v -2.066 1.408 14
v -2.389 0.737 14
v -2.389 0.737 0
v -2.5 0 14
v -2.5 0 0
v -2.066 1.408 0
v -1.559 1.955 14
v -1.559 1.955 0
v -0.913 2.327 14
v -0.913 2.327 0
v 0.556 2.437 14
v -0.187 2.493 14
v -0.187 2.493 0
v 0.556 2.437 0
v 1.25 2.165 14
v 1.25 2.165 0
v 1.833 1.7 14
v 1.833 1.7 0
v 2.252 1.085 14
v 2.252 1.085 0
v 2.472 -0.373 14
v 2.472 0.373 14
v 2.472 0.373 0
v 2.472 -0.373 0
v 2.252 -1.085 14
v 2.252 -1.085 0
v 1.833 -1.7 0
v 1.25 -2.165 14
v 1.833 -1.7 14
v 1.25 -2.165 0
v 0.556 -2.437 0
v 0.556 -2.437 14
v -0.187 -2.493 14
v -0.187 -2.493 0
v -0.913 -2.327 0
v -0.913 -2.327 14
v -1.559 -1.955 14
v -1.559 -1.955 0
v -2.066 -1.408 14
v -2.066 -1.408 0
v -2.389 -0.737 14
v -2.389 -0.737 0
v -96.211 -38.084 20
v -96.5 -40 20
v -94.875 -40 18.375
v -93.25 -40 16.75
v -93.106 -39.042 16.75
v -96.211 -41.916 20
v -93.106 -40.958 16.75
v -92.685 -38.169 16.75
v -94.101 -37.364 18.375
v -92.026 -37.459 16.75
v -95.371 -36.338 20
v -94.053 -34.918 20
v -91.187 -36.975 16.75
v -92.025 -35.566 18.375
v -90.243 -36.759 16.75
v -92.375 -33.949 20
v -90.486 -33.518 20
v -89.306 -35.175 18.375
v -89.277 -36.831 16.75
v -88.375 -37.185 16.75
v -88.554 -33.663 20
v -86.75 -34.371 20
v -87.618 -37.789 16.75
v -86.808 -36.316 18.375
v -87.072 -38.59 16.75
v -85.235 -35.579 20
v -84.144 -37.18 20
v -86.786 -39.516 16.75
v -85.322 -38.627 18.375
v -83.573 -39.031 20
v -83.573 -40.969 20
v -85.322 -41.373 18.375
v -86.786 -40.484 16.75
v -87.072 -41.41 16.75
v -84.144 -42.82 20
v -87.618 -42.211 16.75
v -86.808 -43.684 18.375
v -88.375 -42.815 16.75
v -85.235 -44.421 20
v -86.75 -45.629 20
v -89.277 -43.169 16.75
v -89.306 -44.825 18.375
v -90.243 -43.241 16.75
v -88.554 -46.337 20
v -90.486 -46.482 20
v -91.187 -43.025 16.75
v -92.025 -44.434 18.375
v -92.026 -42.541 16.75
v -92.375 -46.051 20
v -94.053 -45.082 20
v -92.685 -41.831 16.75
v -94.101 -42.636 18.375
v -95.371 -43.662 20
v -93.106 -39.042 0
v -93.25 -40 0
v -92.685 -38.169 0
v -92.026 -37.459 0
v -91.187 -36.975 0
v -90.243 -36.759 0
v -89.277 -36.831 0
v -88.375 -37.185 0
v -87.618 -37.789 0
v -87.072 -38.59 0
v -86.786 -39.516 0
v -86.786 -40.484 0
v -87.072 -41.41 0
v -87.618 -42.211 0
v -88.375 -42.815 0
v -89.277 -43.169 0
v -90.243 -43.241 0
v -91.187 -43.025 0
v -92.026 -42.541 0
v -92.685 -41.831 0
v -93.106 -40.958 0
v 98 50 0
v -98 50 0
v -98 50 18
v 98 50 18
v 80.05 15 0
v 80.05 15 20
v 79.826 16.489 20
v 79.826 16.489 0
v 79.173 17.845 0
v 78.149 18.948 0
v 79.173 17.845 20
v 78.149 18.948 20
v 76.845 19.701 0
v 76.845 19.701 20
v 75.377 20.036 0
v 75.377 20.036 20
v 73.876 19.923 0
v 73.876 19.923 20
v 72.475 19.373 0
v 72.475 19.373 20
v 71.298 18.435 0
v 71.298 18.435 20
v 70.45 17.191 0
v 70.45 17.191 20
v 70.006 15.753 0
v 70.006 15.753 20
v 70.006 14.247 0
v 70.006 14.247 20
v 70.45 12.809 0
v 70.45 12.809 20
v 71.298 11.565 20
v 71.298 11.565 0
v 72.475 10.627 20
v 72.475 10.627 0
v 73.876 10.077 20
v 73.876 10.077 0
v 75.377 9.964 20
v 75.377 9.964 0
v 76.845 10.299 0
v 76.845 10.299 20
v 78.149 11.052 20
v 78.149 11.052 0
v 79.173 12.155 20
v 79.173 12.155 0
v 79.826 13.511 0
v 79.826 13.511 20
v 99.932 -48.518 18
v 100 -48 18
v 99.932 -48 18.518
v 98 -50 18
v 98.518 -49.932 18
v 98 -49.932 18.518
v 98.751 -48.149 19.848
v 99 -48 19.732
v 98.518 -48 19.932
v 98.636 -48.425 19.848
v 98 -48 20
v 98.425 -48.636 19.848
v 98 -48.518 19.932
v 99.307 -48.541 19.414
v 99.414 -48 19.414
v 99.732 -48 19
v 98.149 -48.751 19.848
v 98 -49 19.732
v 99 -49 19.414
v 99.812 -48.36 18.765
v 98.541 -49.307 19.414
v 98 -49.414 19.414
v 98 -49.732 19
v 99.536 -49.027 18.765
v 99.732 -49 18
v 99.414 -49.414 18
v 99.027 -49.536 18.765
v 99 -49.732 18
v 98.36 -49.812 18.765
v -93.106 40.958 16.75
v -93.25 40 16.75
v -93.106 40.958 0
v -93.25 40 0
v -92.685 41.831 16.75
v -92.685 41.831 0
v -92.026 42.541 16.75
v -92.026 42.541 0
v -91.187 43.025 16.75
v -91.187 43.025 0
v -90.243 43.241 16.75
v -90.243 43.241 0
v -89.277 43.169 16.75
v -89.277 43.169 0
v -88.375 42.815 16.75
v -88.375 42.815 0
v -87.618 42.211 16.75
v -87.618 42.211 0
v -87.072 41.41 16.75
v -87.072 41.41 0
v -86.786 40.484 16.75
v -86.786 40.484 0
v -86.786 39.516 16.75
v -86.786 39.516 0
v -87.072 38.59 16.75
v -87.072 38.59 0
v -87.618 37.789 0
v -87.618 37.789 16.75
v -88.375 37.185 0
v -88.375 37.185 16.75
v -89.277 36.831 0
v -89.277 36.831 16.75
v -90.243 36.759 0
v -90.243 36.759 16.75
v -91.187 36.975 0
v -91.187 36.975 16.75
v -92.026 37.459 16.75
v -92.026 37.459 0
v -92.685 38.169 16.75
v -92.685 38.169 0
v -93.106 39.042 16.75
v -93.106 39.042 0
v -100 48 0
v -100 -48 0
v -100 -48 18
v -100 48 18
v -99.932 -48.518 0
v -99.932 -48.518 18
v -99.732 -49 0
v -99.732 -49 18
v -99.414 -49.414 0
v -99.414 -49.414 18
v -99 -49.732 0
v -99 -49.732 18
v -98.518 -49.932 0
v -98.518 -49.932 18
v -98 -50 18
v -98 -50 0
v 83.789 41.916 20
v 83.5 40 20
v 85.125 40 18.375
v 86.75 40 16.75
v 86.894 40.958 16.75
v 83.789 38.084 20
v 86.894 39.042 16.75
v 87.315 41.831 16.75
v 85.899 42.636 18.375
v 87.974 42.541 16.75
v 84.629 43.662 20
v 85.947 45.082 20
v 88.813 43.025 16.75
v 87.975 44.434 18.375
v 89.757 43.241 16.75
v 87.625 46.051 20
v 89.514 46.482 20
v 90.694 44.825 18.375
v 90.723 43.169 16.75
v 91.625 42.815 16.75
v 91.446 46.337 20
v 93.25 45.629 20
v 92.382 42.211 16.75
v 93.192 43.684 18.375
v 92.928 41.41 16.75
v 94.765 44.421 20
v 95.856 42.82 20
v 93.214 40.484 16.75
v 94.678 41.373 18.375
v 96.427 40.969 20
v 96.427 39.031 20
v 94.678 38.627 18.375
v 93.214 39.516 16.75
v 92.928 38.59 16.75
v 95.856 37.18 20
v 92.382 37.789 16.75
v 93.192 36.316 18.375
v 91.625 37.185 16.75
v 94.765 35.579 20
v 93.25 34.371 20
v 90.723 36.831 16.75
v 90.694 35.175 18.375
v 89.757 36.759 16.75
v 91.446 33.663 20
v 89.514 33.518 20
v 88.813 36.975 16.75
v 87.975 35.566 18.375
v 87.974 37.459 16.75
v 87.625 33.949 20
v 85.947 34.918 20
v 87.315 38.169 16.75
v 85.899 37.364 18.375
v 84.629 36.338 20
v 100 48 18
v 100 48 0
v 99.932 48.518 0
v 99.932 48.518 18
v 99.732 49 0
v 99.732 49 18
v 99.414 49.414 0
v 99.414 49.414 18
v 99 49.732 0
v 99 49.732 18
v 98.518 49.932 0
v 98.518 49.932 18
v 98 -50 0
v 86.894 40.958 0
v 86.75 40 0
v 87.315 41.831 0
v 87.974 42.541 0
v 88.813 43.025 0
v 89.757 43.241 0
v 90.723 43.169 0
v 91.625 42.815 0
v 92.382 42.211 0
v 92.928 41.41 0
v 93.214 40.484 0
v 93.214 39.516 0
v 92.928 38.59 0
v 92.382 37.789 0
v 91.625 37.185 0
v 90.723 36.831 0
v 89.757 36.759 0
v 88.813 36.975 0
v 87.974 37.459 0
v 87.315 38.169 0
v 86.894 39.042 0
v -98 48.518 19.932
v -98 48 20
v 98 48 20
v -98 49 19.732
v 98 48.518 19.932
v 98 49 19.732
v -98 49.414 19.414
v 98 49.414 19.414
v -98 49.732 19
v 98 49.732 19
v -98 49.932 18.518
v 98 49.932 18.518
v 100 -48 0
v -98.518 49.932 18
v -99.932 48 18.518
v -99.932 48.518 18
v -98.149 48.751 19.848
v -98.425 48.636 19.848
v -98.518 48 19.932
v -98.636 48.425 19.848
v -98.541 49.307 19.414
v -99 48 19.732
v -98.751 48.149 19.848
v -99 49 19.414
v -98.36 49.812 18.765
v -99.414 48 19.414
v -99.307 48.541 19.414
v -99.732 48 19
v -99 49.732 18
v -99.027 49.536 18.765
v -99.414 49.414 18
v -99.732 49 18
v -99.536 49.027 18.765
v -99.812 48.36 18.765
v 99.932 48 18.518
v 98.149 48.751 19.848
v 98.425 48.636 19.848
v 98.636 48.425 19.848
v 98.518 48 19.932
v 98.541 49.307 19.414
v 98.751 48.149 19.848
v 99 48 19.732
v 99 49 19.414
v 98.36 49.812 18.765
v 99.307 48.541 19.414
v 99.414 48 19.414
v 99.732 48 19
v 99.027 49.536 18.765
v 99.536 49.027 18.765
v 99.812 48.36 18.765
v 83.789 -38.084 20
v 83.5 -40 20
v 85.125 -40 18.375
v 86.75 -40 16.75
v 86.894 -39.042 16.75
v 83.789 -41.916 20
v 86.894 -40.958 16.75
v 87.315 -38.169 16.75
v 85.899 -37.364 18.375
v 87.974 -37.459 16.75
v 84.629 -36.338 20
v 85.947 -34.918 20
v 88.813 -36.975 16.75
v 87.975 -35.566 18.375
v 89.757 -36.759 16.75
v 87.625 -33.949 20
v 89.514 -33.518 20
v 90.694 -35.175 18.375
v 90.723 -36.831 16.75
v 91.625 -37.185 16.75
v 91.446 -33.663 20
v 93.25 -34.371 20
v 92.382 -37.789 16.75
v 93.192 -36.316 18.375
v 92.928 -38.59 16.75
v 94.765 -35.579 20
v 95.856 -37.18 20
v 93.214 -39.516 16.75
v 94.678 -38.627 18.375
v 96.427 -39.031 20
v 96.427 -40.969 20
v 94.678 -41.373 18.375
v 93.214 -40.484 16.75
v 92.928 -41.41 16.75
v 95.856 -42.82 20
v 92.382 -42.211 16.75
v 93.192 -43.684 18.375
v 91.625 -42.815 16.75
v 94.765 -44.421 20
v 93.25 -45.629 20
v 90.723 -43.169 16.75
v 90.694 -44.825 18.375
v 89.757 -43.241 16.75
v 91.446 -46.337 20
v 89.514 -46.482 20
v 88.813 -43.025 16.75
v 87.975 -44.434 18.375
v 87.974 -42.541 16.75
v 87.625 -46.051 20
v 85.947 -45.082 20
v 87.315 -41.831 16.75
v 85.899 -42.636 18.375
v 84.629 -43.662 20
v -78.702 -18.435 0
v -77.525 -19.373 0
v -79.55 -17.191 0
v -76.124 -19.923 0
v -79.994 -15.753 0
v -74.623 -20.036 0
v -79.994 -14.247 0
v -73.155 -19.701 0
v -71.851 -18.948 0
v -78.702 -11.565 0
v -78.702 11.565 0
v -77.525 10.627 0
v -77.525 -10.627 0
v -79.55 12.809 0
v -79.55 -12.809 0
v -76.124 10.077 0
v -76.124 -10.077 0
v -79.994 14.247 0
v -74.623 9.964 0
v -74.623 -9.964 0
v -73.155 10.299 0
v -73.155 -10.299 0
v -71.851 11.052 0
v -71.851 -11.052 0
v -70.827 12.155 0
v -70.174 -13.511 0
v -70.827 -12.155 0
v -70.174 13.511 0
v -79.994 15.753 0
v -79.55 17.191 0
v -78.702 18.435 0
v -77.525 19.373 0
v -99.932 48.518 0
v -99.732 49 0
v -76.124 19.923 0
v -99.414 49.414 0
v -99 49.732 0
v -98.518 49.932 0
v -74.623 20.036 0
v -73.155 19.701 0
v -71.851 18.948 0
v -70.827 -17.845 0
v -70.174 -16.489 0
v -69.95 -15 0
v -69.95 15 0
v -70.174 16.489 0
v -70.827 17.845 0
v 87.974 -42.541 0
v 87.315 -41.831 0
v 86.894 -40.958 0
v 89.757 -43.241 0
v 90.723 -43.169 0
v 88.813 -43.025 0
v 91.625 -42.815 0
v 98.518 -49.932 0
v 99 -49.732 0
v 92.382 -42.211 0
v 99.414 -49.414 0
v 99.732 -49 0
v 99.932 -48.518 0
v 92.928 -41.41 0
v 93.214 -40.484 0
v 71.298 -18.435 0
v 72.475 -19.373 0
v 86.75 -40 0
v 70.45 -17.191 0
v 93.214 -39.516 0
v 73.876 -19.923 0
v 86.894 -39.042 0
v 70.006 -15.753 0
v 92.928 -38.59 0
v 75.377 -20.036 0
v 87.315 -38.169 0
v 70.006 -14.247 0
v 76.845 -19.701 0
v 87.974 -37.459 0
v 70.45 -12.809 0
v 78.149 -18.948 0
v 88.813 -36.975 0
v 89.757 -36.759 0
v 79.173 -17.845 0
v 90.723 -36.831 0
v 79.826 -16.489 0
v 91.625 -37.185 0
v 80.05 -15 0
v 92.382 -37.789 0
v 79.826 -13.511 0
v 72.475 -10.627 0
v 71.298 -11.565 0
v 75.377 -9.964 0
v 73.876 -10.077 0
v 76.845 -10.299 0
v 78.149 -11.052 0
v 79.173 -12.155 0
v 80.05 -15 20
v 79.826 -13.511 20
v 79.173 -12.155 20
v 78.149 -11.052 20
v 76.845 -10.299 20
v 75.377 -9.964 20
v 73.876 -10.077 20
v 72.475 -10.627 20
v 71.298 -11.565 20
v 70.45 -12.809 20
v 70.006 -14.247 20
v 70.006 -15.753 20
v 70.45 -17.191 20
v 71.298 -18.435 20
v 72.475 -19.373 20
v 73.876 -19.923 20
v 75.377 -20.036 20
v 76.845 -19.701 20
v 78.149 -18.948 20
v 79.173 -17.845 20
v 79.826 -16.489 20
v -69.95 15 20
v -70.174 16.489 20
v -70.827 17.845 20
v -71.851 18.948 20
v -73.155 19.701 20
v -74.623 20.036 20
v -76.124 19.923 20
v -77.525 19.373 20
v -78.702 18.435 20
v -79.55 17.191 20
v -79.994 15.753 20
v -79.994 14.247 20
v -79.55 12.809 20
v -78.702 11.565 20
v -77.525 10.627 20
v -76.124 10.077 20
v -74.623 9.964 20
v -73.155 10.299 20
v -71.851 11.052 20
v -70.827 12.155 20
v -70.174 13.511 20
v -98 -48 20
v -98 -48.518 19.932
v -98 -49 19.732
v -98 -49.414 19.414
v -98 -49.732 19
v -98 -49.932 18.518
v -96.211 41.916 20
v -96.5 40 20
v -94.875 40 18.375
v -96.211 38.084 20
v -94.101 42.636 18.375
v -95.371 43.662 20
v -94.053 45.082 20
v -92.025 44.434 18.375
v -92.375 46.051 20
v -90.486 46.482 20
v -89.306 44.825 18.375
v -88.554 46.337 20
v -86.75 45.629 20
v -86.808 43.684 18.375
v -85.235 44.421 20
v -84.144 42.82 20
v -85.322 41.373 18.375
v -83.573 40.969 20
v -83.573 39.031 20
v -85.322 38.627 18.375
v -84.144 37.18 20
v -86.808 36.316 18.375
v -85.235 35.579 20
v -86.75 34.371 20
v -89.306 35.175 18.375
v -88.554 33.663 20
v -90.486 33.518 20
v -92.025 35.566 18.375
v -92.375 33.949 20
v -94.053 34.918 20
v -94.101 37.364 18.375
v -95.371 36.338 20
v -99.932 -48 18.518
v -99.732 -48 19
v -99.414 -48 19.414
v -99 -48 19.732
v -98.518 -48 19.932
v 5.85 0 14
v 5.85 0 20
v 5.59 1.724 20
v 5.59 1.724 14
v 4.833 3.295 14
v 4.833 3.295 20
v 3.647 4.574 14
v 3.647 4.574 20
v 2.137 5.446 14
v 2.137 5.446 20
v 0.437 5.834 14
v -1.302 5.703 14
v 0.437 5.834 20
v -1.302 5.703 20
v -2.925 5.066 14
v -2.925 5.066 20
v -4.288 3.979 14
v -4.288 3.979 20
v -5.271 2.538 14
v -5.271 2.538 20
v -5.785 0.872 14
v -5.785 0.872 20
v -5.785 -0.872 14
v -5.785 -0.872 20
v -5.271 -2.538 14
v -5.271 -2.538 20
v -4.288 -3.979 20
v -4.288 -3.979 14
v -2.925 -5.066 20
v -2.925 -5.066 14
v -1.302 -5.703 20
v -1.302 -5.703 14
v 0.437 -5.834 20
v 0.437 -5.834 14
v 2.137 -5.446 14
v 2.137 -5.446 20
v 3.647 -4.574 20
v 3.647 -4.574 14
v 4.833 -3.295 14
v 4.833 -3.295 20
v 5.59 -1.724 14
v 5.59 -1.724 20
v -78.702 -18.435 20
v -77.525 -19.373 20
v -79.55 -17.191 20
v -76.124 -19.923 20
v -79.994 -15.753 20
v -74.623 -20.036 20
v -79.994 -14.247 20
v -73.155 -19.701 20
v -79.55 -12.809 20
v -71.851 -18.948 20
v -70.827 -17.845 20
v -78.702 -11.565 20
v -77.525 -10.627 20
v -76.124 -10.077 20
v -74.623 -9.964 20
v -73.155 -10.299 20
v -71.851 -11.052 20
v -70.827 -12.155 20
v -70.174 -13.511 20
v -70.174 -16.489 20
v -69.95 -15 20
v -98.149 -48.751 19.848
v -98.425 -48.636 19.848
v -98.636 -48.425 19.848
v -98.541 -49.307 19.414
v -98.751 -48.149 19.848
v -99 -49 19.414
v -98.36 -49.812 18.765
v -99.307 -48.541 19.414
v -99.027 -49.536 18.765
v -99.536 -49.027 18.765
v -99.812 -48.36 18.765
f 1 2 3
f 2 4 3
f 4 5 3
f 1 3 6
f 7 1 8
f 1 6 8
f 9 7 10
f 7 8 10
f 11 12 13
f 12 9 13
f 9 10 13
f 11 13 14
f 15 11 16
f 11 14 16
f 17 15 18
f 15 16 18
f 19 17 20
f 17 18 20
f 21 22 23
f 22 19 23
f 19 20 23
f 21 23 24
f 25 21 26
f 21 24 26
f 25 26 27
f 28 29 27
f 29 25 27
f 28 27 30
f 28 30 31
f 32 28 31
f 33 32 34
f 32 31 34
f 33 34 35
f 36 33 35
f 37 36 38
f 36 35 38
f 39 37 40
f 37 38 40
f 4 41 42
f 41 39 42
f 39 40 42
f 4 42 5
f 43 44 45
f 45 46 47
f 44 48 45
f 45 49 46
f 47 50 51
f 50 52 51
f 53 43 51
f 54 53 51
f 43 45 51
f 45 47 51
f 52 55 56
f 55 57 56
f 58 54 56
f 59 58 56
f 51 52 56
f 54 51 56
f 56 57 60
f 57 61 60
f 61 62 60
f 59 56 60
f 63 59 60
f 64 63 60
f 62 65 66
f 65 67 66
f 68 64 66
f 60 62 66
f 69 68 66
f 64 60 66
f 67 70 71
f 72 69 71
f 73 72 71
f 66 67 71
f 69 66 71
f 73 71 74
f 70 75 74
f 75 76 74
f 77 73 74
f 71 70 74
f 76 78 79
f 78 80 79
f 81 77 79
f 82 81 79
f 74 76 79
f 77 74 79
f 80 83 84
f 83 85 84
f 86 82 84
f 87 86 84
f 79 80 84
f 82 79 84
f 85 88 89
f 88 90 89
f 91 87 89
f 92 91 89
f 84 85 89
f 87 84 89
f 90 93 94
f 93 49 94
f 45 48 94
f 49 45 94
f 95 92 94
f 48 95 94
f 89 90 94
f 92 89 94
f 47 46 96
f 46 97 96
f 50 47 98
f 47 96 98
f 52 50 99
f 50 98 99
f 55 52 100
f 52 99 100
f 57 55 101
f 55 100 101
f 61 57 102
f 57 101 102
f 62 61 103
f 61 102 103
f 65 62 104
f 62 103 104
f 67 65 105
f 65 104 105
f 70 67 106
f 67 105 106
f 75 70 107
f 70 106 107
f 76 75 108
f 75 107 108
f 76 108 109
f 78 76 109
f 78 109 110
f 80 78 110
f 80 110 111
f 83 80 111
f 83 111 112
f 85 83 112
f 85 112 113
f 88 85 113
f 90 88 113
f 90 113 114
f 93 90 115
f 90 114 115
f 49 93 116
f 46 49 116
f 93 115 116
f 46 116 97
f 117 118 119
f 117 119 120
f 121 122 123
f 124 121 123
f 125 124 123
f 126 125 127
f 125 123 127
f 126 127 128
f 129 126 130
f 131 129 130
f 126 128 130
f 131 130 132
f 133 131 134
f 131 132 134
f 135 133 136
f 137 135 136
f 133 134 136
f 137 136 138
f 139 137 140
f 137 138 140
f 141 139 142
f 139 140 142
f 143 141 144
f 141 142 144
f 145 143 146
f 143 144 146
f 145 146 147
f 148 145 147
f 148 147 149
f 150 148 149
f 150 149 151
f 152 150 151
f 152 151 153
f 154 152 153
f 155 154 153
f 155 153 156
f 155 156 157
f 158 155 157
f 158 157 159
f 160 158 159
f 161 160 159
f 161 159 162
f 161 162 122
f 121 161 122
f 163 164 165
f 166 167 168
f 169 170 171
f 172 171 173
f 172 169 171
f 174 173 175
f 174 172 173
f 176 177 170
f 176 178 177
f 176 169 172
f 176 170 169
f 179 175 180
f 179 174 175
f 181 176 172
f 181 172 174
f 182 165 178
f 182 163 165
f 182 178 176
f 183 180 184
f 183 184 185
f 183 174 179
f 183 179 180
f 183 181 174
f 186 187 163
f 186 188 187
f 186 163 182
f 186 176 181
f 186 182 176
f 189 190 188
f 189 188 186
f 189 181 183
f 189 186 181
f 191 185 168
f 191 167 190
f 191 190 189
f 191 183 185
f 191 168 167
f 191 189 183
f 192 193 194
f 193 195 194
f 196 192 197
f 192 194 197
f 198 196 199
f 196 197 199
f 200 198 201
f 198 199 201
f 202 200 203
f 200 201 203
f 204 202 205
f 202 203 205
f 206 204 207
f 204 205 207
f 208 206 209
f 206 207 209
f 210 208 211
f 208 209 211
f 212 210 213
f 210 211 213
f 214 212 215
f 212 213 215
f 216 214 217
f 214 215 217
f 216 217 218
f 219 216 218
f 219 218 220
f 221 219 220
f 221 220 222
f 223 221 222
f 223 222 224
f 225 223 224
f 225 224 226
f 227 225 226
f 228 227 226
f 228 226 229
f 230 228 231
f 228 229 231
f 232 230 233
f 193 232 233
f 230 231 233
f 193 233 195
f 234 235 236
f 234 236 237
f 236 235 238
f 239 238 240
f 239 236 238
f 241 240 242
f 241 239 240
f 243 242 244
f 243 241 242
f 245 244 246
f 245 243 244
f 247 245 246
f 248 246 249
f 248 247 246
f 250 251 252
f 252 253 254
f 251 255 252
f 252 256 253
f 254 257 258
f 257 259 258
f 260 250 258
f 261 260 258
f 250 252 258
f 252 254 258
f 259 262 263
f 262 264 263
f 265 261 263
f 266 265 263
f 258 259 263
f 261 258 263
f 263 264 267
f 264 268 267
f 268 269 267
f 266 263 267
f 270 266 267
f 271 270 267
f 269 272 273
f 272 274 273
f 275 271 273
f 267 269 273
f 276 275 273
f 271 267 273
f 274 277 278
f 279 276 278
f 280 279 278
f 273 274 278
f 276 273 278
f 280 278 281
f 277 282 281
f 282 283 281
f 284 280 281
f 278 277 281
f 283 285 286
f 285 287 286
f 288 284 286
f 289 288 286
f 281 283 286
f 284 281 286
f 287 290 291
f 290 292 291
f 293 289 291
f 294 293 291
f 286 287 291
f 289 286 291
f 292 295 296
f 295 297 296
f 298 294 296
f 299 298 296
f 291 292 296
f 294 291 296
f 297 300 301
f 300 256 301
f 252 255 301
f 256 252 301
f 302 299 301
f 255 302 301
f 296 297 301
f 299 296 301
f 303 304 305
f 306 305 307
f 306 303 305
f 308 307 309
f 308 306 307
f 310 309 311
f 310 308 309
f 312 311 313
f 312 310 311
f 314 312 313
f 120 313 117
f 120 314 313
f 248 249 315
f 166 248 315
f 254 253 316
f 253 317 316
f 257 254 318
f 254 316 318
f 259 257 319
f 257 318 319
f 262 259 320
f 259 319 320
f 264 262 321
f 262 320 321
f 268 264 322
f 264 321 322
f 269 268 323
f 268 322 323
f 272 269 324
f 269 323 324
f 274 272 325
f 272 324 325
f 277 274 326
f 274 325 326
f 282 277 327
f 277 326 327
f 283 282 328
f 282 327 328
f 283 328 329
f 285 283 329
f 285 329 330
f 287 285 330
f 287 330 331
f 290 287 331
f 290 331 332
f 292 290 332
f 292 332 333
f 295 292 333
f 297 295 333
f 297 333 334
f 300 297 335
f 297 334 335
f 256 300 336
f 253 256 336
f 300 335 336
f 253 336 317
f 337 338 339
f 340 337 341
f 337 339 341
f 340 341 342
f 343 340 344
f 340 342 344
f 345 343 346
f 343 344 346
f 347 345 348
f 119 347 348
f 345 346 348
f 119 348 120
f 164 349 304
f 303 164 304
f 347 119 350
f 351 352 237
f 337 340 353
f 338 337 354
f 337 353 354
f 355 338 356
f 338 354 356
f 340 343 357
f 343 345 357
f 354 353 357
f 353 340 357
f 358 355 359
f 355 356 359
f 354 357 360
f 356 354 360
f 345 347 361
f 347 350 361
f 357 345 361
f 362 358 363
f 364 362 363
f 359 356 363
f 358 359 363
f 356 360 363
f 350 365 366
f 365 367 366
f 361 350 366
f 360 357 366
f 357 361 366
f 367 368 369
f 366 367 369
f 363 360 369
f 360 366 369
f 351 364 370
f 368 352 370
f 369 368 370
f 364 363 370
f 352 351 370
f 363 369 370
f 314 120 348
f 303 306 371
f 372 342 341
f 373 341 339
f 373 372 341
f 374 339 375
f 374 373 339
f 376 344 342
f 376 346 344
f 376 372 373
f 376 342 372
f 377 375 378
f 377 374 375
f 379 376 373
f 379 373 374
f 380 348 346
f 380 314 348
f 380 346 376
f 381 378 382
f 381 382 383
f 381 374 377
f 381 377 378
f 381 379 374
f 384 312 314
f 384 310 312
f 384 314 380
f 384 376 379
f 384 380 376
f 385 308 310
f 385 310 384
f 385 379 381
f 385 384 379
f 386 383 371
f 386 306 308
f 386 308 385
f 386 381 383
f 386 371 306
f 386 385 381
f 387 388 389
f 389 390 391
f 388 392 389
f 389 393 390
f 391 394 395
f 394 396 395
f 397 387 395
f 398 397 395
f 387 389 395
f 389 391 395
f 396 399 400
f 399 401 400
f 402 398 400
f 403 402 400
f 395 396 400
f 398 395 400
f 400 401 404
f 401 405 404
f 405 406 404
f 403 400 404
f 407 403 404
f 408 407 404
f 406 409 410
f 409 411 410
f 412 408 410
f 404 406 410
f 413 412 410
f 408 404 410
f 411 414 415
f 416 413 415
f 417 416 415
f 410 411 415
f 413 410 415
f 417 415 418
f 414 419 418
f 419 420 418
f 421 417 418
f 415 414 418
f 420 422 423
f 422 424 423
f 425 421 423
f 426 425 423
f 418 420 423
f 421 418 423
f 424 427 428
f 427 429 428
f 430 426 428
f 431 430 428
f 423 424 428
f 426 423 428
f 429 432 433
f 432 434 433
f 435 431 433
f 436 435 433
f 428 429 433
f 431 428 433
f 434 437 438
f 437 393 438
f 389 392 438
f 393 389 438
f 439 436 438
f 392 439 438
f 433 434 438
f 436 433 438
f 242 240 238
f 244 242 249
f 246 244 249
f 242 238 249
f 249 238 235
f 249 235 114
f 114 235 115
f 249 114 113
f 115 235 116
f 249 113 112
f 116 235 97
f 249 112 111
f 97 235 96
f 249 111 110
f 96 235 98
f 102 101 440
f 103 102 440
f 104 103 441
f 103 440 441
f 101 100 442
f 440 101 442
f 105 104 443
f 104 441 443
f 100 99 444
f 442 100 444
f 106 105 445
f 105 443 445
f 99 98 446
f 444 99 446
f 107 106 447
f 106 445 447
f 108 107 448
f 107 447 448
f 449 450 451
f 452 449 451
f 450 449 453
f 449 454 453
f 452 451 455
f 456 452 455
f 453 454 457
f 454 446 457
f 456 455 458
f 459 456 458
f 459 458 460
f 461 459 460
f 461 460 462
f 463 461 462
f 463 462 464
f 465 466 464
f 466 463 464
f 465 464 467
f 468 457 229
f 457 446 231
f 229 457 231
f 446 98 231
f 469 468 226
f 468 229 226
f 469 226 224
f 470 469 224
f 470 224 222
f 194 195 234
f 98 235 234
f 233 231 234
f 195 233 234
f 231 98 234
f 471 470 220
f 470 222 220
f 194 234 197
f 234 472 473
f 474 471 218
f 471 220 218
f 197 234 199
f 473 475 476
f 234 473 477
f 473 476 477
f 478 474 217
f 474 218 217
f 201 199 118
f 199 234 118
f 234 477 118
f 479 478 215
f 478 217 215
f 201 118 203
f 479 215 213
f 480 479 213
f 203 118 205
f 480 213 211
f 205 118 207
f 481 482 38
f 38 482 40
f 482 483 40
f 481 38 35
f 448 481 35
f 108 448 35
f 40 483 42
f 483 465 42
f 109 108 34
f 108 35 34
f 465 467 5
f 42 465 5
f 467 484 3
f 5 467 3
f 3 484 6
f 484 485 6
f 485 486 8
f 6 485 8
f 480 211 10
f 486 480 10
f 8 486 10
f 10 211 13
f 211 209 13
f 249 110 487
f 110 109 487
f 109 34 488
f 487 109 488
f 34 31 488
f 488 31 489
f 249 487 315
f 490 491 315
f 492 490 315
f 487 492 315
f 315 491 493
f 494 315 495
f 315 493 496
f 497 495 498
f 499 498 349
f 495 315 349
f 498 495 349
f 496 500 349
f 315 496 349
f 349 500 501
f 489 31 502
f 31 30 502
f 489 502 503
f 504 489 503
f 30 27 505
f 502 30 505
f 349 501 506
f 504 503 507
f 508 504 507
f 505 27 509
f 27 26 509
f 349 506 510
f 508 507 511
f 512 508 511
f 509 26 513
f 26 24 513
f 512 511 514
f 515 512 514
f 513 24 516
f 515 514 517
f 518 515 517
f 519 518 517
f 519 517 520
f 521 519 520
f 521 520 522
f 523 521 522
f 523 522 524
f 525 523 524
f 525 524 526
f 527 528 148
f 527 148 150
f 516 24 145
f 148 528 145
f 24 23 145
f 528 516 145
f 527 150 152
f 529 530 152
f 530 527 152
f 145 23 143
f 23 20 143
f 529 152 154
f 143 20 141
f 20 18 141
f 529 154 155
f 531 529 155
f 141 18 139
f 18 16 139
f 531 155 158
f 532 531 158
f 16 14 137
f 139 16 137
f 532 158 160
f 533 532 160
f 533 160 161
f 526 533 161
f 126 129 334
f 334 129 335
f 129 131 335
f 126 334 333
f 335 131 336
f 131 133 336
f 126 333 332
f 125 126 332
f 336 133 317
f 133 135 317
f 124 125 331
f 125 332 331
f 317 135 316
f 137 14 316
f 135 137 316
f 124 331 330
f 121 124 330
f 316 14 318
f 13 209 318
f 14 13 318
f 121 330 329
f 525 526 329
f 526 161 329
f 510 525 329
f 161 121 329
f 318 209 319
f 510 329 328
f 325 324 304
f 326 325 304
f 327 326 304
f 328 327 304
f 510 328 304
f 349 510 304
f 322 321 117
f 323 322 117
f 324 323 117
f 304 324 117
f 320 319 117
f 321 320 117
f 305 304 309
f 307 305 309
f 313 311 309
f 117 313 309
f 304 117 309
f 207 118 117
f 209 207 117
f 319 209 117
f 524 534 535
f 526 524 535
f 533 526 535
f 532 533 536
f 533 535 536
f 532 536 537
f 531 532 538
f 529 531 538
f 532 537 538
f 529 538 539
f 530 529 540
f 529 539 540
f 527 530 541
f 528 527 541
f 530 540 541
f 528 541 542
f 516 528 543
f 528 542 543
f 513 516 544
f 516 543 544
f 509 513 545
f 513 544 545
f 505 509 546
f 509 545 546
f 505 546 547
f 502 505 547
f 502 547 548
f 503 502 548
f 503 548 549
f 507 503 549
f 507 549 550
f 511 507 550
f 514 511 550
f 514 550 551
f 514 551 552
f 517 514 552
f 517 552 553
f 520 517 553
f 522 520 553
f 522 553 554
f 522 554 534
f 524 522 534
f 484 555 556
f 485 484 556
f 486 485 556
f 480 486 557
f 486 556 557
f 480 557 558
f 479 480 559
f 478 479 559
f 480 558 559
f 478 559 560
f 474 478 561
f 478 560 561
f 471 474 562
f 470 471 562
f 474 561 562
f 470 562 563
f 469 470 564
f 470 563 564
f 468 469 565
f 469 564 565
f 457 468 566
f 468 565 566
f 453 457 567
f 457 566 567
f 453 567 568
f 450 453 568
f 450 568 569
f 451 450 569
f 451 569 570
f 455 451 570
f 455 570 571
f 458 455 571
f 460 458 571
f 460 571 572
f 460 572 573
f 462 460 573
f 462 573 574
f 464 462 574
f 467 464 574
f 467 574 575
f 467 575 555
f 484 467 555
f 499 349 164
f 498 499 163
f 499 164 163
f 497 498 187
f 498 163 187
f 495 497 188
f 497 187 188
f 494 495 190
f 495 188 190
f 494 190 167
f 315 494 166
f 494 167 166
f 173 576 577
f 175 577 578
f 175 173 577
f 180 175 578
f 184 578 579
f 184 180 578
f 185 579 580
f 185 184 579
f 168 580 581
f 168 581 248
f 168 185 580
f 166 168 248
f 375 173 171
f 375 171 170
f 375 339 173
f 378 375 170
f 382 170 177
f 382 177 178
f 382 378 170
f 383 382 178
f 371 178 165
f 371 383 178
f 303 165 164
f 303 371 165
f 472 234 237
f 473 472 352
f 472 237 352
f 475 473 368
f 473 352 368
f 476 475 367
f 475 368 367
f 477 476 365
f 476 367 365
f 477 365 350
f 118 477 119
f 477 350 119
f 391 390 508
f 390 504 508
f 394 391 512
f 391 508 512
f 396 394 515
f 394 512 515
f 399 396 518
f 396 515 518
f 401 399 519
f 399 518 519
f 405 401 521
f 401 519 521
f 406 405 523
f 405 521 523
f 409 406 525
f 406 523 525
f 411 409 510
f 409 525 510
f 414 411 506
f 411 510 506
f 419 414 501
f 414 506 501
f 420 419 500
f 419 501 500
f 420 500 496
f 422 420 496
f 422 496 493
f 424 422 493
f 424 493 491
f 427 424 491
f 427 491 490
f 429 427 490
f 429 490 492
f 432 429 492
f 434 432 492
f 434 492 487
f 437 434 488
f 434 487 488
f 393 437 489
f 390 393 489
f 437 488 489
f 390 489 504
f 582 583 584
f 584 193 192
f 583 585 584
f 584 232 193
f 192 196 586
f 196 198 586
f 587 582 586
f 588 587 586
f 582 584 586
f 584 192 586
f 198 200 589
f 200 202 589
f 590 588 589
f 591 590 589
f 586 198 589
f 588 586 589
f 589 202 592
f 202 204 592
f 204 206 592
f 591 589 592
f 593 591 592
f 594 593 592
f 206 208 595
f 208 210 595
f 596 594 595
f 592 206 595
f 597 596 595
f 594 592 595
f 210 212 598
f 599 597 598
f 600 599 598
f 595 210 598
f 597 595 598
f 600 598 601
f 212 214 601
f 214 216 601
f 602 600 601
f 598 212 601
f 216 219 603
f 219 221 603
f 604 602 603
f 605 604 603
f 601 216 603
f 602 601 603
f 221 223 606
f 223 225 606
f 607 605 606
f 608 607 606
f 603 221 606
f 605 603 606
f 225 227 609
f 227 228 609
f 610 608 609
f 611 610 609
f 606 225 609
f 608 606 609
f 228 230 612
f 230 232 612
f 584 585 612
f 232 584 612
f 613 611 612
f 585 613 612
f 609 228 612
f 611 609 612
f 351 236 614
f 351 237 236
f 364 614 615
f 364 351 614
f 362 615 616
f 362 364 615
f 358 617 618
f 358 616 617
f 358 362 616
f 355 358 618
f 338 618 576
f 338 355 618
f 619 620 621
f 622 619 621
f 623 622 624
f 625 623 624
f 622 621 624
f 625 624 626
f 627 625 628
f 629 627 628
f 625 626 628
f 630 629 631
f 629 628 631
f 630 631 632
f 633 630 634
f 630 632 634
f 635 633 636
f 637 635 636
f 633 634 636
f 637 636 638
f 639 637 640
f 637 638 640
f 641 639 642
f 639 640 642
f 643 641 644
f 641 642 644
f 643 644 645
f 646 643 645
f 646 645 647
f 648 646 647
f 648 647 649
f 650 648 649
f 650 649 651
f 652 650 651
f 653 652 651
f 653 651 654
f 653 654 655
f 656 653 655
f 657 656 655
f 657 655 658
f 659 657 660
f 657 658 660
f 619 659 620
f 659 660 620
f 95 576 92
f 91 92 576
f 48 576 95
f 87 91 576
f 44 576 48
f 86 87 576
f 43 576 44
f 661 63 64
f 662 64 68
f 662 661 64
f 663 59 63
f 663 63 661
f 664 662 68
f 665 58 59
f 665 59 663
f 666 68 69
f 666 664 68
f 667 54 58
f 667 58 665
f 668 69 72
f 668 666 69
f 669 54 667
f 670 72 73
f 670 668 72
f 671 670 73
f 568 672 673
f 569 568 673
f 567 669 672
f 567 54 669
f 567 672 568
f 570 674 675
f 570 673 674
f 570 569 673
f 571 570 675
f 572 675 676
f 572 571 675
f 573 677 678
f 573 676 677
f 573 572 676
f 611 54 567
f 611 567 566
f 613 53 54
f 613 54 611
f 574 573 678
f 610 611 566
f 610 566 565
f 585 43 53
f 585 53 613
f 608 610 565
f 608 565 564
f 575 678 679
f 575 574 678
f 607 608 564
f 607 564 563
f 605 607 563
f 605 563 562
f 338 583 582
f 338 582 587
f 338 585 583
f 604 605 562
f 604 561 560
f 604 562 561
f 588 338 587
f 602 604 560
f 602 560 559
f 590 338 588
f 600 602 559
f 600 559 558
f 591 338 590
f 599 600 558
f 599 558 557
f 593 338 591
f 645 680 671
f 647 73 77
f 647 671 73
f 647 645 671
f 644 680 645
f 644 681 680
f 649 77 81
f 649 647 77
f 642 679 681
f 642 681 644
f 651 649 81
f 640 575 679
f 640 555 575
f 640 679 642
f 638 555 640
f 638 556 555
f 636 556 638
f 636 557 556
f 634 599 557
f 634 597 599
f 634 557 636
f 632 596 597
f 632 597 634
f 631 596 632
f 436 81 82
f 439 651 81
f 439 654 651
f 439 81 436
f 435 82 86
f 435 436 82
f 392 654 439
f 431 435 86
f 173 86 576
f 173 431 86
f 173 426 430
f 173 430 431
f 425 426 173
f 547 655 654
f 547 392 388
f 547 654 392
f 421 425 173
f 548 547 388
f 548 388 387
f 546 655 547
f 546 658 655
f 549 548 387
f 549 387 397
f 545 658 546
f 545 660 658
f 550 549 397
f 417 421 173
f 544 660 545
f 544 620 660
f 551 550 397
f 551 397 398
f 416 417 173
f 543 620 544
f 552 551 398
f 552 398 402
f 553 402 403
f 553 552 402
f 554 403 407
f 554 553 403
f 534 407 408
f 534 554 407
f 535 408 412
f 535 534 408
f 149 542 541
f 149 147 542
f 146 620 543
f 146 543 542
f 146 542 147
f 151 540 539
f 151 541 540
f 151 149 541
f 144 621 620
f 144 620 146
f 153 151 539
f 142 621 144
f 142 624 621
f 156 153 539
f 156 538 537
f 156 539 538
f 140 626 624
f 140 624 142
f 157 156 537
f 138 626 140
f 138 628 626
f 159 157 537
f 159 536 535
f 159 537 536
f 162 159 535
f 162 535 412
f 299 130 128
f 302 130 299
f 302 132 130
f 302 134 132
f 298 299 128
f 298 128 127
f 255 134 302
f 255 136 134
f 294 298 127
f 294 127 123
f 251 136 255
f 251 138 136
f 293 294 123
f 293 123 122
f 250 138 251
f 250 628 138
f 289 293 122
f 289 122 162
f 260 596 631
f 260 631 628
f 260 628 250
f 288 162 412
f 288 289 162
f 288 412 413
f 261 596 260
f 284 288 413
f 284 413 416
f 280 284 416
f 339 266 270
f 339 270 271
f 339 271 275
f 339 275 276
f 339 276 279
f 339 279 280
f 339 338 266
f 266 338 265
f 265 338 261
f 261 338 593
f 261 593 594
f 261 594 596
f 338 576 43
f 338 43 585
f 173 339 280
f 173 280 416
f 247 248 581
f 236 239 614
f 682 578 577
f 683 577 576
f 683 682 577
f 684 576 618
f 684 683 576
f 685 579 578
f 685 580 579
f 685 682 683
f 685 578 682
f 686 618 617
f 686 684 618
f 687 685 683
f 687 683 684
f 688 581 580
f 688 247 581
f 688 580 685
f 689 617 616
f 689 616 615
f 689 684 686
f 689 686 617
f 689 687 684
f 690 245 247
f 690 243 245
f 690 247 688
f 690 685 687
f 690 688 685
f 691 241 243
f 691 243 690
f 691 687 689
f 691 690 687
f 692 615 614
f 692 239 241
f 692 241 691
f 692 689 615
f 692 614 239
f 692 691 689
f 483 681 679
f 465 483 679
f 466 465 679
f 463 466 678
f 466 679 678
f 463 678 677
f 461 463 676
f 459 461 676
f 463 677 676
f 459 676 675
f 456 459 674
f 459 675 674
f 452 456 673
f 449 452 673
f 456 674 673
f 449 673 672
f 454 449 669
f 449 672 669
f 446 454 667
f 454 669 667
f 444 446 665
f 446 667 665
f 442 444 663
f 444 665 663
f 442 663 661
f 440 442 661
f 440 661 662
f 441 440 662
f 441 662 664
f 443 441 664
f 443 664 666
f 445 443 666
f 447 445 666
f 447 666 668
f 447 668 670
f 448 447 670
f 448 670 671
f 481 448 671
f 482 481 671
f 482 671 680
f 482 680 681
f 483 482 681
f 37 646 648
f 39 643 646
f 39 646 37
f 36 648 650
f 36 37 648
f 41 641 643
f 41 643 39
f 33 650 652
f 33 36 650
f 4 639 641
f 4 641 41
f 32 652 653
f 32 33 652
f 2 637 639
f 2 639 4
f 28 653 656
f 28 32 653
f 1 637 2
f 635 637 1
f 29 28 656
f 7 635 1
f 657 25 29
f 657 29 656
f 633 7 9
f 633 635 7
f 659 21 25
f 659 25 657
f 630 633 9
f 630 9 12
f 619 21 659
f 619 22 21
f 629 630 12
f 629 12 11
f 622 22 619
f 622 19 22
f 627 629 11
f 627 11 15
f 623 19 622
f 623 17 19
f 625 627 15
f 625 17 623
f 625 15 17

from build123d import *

# Parameters (mm, degrees)
F0_W           = 200
F0_H           = 100
F1_DEPTH       = 20
F2_R           = 5.05
F3_DEPTH       = 20.001
F5_D           = 6.5
F5_DEPTH       = 25
F5_CSINK_D     = 13
F5_CSINK_ANGLE = 90
F5_TIP         = 1.9527970118
F7_D           = 5
F7_DEPTH       = 20
F7_TIP         = 1.5021515476
F8_R           = 5.85
F8_R_2         = 2.5
F9_DEPTH       = 6
F10_R          = 2


with BuildPart() as f1:
    # F0 (on Top) → F1 (new body)
    with BuildSketch(Plane.XY):
        Rectangle(F0_W, F0_H)
    extrude(amount=F1_DEPTH)

    # F2 (on face) → F3 (cut, through all)
    with BuildSketch(Plane.XY.offset(20)):
        with Locations((-75, 15)):
            Circle(F2_R)
        with Locations((-75, -15)):
            Circle(F2_R)
        with Locations((75, -15)):
            Circle(F2_R)
        with Locations((75, 15)):
            Circle(F2_R)
    extrude(amount=-F3_DEPTH, mode=Mode.SUBTRACT)

    # F5
    with Locations(Plane.XY.offset(20)):
        with Locations((-90, 40), (90, 40), (90, -40), (-90, -40)):
            CounterSinkHole(F5_D / 2, F5_CSINK_D / 2, depth=F5_DEPTH, counter_sink_angle=F5_CSINK_ANGLE)
            with Locations((0, 0, -(F5_DEPTH + F5_TIP / 2))):  # 118° drill point
                Cone(0, F5_D / 2, F5_TIP, mode=Mode.SUBTRACT)

    # F7
    with Locations(Plane.XY.offset(20)):
        with Locations((0, 0)):
            Hole(F7_D / 2, depth=F7_DEPTH)
            with Locations((0, 0, -(F7_DEPTH + F7_TIP / 2))):  # 118° drill point
                Cone(0, F7_D / 2, F7_TIP, mode=Mode.SUBTRACT)

    # F8 (on face) → F9 (cut)
    with BuildSketch(Plane.XY.offset(20)):
        Circle(F8_R)
        Circle(F8_R_2, mode=Mode.SUBTRACT)
    extrude(amount=-F9_DEPTH, mode=Mode.SUBTRACT)

    # F10
    f10_edges = [f1.edges().sort_by_distance(p)[0] for p in [
        (-100, -50, 10),
        (100, -50, 10),
        (100, 50, 10),
        (-100, 50, 10),
        (0, 50, 20),
        (100, 0, 20),
        (0, -50, 20),
        (-100, 0, 20),
    ]]
    fillet(f10_edges, radius=F10_R)


solid = f1.part
